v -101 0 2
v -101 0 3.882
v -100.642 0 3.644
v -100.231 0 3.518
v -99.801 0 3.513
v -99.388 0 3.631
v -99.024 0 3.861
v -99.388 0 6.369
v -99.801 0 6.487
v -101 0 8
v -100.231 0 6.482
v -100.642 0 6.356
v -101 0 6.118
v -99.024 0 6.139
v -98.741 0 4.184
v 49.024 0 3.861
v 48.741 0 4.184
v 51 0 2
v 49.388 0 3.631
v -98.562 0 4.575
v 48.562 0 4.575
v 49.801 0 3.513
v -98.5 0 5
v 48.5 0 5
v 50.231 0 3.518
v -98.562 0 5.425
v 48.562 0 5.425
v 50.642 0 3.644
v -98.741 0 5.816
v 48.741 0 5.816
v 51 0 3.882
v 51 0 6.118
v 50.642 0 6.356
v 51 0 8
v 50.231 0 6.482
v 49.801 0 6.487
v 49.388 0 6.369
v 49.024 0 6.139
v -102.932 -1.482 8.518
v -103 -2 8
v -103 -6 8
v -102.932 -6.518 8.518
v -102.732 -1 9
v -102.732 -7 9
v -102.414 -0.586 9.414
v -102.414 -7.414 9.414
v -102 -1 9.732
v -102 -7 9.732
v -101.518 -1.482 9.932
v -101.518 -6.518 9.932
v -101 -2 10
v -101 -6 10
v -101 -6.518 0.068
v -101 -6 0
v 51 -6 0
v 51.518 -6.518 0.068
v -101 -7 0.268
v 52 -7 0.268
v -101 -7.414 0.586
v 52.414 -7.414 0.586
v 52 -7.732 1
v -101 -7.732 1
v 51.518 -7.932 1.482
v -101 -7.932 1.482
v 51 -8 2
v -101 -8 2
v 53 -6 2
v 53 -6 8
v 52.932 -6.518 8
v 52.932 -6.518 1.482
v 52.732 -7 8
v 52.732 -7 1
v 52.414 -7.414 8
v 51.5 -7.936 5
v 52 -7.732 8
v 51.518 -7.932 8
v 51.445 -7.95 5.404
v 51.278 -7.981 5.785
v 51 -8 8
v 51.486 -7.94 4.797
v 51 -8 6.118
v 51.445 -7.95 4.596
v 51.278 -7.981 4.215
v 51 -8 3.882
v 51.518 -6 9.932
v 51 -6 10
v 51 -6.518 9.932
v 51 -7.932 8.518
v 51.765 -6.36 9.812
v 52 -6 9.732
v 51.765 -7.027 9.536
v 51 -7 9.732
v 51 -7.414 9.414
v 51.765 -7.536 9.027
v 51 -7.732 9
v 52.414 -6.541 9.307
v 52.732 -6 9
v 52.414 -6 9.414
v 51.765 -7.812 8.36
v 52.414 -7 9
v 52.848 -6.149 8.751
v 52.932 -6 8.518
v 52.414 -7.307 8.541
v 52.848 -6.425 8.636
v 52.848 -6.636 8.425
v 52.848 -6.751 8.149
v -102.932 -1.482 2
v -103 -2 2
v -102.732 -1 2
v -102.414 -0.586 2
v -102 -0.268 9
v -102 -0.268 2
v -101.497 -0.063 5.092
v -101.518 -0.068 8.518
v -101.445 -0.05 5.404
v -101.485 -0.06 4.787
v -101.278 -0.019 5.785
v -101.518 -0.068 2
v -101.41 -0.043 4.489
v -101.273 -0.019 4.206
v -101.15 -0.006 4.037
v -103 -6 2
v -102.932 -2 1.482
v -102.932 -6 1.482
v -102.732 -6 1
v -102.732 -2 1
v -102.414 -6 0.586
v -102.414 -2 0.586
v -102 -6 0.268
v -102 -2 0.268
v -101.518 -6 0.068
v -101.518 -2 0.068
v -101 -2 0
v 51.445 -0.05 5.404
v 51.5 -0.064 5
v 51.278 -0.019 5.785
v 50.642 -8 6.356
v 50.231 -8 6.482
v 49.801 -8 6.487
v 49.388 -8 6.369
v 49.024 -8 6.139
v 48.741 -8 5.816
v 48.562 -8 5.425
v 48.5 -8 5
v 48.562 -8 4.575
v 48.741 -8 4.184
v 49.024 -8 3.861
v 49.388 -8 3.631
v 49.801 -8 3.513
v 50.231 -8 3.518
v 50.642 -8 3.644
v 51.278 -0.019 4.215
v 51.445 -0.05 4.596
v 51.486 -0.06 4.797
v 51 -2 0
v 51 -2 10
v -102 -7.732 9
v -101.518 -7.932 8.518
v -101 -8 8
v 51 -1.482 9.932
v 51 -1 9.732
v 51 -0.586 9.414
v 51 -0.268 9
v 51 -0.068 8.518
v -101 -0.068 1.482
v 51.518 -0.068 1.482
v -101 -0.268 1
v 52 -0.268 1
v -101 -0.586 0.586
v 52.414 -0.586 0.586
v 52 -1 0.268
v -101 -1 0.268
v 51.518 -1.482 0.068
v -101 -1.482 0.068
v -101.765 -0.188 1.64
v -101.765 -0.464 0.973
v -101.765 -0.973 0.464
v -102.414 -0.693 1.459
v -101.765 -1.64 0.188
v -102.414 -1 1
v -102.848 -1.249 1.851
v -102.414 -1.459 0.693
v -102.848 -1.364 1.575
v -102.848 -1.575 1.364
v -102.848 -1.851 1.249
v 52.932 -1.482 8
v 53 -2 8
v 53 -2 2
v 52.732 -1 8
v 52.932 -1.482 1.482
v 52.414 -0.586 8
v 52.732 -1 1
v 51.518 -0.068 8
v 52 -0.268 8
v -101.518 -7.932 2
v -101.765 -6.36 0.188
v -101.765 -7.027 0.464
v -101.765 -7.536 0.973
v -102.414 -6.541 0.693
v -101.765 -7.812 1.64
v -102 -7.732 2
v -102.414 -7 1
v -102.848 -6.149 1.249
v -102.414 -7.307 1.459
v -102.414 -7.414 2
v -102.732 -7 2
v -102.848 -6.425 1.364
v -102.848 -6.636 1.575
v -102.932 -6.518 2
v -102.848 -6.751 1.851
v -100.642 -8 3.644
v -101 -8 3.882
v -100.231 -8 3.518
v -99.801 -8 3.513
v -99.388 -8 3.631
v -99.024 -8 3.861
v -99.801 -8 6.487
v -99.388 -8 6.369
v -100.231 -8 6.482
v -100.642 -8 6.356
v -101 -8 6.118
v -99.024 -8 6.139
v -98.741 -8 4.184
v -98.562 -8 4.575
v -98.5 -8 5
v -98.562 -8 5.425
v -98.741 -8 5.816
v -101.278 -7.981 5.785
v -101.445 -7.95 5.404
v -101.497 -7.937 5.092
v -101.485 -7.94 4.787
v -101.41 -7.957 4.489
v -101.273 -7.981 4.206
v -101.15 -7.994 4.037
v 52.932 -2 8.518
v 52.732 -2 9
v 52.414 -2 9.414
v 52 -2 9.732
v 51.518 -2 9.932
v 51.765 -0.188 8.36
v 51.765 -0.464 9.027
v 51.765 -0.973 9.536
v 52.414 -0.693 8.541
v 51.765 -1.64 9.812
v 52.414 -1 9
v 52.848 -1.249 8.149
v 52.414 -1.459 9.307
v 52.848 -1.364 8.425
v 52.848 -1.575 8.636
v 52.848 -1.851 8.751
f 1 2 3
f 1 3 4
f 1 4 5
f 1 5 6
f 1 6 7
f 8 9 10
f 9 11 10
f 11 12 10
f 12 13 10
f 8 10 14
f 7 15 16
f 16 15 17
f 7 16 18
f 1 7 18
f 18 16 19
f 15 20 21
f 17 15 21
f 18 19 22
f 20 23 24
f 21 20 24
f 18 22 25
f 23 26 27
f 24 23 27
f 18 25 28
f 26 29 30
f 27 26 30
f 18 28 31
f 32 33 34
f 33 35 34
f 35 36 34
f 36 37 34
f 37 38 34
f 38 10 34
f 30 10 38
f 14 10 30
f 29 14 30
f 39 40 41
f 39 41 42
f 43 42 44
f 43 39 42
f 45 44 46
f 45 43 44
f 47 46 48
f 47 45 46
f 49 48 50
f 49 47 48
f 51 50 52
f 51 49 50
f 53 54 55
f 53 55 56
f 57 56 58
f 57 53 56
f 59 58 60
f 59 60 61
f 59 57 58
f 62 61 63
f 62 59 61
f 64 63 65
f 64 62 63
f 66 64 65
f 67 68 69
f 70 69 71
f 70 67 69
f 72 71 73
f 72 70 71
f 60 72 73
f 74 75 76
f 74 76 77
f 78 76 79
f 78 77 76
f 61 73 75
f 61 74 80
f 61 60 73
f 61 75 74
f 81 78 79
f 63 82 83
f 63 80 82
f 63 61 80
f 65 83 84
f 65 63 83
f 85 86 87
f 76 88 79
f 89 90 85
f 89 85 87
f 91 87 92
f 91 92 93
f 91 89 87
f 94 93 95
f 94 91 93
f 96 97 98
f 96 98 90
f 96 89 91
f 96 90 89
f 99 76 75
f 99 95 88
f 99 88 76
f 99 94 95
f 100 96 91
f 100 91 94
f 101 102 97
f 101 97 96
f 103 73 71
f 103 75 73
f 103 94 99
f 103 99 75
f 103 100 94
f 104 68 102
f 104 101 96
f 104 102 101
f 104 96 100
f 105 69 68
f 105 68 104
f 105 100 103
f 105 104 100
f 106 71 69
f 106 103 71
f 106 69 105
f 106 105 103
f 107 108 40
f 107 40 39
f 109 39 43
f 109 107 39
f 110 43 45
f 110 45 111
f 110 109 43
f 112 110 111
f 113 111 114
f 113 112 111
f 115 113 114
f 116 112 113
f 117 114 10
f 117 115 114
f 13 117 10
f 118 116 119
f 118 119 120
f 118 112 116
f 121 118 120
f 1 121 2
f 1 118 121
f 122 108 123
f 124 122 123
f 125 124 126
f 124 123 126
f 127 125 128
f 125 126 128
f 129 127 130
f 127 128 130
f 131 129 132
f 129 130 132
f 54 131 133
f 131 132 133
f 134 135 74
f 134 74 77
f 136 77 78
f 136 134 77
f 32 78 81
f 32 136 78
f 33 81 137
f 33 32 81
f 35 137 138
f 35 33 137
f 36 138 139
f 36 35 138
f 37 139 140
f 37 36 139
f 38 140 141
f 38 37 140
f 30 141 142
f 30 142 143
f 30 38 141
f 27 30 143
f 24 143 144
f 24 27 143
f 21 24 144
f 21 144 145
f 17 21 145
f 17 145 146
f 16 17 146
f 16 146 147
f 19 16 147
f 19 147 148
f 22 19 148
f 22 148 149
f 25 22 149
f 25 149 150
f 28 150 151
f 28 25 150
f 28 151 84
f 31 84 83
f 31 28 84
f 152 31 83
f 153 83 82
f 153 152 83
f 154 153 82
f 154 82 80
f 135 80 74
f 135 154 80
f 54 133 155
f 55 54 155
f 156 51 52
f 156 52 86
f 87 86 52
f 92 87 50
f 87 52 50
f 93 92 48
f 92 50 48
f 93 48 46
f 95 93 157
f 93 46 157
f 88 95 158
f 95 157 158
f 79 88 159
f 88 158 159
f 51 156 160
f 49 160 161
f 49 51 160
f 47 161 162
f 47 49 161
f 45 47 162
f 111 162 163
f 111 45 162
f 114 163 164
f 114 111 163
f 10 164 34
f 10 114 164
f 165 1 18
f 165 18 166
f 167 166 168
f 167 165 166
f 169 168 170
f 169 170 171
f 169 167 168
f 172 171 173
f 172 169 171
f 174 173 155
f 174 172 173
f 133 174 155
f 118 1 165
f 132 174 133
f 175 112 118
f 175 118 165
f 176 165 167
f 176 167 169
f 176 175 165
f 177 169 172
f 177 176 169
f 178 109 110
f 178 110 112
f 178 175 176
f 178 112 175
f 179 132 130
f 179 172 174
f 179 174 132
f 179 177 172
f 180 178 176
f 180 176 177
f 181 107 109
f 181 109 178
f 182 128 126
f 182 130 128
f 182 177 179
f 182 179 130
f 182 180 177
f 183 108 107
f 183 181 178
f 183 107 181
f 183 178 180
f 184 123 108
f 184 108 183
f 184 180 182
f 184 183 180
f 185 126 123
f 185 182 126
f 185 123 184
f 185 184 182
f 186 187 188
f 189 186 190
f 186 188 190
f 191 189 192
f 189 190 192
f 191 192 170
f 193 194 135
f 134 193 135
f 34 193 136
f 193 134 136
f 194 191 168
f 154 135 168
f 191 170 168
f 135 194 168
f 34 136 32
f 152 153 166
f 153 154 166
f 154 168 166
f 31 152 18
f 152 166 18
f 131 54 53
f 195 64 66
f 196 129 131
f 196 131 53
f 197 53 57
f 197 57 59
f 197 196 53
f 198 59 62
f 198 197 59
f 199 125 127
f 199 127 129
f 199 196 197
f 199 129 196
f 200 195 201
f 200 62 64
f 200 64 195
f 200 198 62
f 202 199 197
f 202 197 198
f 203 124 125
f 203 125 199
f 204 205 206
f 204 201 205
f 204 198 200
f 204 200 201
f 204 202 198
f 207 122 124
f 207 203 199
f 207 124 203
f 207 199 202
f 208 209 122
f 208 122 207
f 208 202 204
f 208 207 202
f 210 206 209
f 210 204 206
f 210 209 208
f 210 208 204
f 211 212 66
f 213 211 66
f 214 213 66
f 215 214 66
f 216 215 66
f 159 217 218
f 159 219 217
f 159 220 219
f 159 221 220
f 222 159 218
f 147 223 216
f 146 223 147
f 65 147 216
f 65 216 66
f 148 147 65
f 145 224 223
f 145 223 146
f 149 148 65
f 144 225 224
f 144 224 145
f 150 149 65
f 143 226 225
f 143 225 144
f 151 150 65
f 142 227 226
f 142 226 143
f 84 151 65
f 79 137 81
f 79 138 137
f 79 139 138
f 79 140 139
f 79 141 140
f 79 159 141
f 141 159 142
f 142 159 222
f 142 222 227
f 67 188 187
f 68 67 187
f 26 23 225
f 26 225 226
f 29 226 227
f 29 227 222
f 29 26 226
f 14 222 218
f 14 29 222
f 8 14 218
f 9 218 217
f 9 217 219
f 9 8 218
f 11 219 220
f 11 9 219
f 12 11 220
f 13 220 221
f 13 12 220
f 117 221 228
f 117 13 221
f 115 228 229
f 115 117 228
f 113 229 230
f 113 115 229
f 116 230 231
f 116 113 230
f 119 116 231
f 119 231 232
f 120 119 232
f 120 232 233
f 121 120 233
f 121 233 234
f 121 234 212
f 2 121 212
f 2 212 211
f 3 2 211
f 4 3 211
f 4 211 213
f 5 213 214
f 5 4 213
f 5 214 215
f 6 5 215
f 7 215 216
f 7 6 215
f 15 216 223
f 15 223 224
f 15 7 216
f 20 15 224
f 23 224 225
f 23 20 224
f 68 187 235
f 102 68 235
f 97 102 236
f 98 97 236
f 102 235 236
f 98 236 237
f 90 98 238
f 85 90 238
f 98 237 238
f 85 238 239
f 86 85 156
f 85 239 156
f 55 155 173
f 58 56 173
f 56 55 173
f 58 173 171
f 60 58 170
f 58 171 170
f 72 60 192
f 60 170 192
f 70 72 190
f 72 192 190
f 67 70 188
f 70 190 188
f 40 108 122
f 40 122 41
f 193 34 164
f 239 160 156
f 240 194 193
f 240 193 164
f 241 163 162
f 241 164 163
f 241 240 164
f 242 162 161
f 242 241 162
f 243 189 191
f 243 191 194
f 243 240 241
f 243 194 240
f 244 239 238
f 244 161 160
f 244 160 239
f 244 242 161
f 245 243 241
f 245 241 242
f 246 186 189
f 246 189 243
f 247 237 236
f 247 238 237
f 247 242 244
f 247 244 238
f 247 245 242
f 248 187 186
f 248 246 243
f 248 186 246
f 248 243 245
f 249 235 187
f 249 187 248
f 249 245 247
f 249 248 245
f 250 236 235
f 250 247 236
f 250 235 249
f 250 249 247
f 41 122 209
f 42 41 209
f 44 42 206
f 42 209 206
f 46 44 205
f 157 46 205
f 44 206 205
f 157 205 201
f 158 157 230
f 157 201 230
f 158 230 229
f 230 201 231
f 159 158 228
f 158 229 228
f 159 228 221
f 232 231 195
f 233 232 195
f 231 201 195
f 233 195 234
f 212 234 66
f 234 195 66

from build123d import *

# Parameters (mm, degrees)
F0_W         = 156
F0_H         = 10
F0_R         = 1.5
F1_DEPTH     = 8
F2_T1_DEPTH  = 4
F2_T3_DEPTH  = 18
F2_T5_DEPTH  = 159
F2_T7_DEPTH  = 13
F2_S11_W     = 2
F2_S11_H     = 2
F2_T12_DEPTH = 2
F2_S17_W     = 2
F2_S17_H     = 2
F2_T18_DEPTH = 2
F3_T1_DEPTH  = 11
F3_T3_DEPTH  = 4
F3_T5_DEPTH  = 157
F3_S9_W      = 2.04
F3_S9_H      = 2.04
F3_T10_DEPTH = 2.04
F3_S15_W     = 2.04
F3_S15_H     = 2.04
F3_T16_DEPTH = 2.04


# Not quite as in the source:
# - a fillet or chamfer that OpenCascade refuses, or shapes differently, is made with other operations: its cross-section is extruded or revolved along the edge and cut away or added


with BuildPart() as f1:
    # F0 (on Front) → F1 (new body)
    with BuildSketch(Plane.XZ):
        with Locations((-25, 5)):
            Rectangle(F0_W, F0_H)
        with Locations((-100, 5)):
            Circle(F0_R, mode=Mode.SUBTRACT)
        with Locations((50, 5)):
            Circle(F0_R, mode=Mode.SUBTRACT)
    extrude(amount=F1_DEPTH)

    # F2: fillet of radius 2 on 7 edges, made by hand

    # F2_s2 → F2_t1 (cut)
    with BuildSketch(Plane.XZ.offset(2)):
        with BuildLine():
            ThreePointArc((53, 8), (52.4142135624, 9.4142135624), (51, 10))
            Line((51, 10), (53, 10))
            Line((53, 10), (53, 8))
        make_face()
    extrude(amount=F2_T1_DEPTH, mode=Mode.SUBTRACT)

    # F2_s4 → F2_t3 (cut)
    with BuildSketch(Plane.XZ.offset(-5)):
        with BuildLine():
            ThreePointArc((-103, 8), (-102.4142135624, 9.4142135624), (-101, 10))
            Line((-101, 10), (-103, 10))
            Line((-103, 10), (-103, 8))
        make_face()
        with BuildLine():
            ThreePointArc((51, 0), (52.4142135624, 0.5857864376), (53, 2))
            Line((53, 2), (53, 0))
            Line((53, 0), (51, 0))
        make_face()
    extrude(amount=F2_T3_DEPTH, mode=Mode.SUBTRACT)

    # F2_s6 → F2_t5 (cut)
    with BuildSketch(Plane.YZ.offset(-108)):
        with BuildLine():
            ThreePointArc((-2, 10), (-0.5857864376, 9.4142135624), (0, 8))
            Line((0, 8), (0, 10))
            Line((0, 10), (-2, 10))
        make_face()
        with BuildLine():
            ThreePointArc((-6, 10), (-7.4142135624, 9.4142135624), (-8, 8))
            Line((-8, 8), (-8, 10))
            Line((-8, 10), (-6, 10))
        make_face()
    extrude(amount=F2_T5_DEPTH, mode=Mode.SUBTRACT)

    # F2_s8 → F2_t7 (cut)
    with BuildSketch(Plane.XY.offset(-5)):
        with BuildLine():
            ThreePointArc((53, -2), (52.4142135624, -0.5857864376), (51, 0))
            Line((51, 0), (53, 0))
            Line((53, 0), (53, -2))
        make_face()
        with BuildLine():
            ThreePointArc((53, -6), (52.4142135624, -7.4142135624), (51, -8))
            Line((51, -8), (53, -8))
            Line((53, -8), (53, -6))
        make_face()
    extrude(amount=F2_T7_DEPTH, mode=Mode.SUBTRACT)


with BuildPart() as f2_tool10:
    # F2_s11 → F2_t12 (new body)
    with BuildSketch(Plane.YZ.offset(51)):
        with Locations((-1, 9)):
            Rectangle(F2_S11_W, F2_S11_H)
    extrude(amount=F2_T12_DEPTH)

    # F2_s13 → F2_t14 (revolve, cut)
    with BuildSketch(Plane(origin=(51, -2, 8), x_dir=(0, -0.7071067812, -0.7071067812), z_dir=(0, -0.7071067812, 0.7071067812))):
        with BuildLine():
            ThreePointArc((0, -2), (2, 0), (0, 2))
            Line((0, 2), (0, -2))
        make_face()
    revolve(axis=Axis((51, -2, 8), (1, 0, 0)), mode=Mode.SUBTRACT)


with BuildPart() as f1_1:
    add(f1.part)

    # F2_t9: cut F2_tool10
    add(f2_tool10.part, mode=Mode.SUBTRACT)


with BuildPart() as f2_tool16:
    # F2_s17 → F2_t18 (new body)
    with BuildSketch(Plane.YZ.offset(51)):
        with Locations((-7, 9)):
            Rectangle(F2_S17_W, F2_S17_H)
    extrude(amount=F2_T18_DEPTH)

    # F2_s19 → F2_t20 (revolve, cut)
    with BuildSketch(Plane(origin=(51, -6, 8), x_dir=(0, 0.7071067812, -0.7071067812), z_dir=(0, -0.7071067812, -0.7071067812))):
        with BuildLine():
            ThreePointArc((0, -2), (2, 0), (0, 2))
            Line((0, 2), (0, -2))
        make_face()
    revolve(axis=Axis((51, -6, 8), (1, 0, 0)), mode=Mode.SUBTRACT)


with BuildPart() as f1_2:
    add(f1_1.part)

    # F2_t15: cut F2_tool16
    add(f2_tool16.part, mode=Mode.SUBTRACT)

    # F3: fillet of radius 2 on 7 edges, made by hand

    # F3_s2 → F3_t1 (cut)
    with BuildSketch(Plane.XY.offset(2)):
        with BuildLine():
            ThreePointArc((-103, -2), (-102.4142135624, -0.5857864376), (-101, 0))
            Line((-101, 0), (-103, 0))
            Line((-103, 0), (-103, -2))
        make_face()
        with BuildLine():
            ThreePointArc((-103, -6), (-102.4142135624, -7.4142135624), (-101, -8))
            Line((-101, -8), (-103, -8))
            Line((-103, -8), (-103, -6))
        make_face()
    extrude(amount=F3_T1_DEPTH, mode=Mode.SUBTRACT)

    # F3_s4 → F3_t3 (cut)
    with BuildSketch(Plane.XZ.offset(2)):
        with BuildLine():
            ThreePointArc((-103, 2), (-102.4142135624, 0.5857864376), (-101, 0))
            Line((-101, 0), (-103, 0))
            Line((-103, 0), (-103, 2))
        make_face()
    extrude(amount=F3_T3_DEPTH, mode=Mode.SUBTRACT)

    # F3_s6 → F3_t5 (cut)
    with BuildSketch(Plane.YZ.offset(-101)):
        with BuildLine():
            ThreePointArc((0, 2), (-0.5857864376, 0.5857864376), (-2, 0))
            Line((-2, 0), (0, 0))
            Line((0, 0), (0, 2))
        make_face()
        with BuildLine():
            ThreePointArc((-6, 0), (-7.4142135624, 0.5857864376), (-8, 2))
            Line((-8, 2), (-8, 0))
            Line((-8, 0), (-6, 0))
        make_face()
    extrude(amount=F3_T5_DEPTH, mode=Mode.SUBTRACT)


with BuildPart() as f3_tool8:
    # F3_s9 → F3_t10 (new body)
    with BuildSketch(Plane.YZ.offset(-101)):
        with Locations((-0.98, 0.98)):
            Rectangle(F3_S9_W, F3_S9_H)
    extrude(amount=-F3_T10_DEPTH)

    # F3_s11 → F3_t12 (revolve, cut)
    with BuildSketch(Plane(origin=(-101, -2, 2), x_dir=(0, -0.7071067812, 0.7071067812), z_dir=(0, -0.7071067812, -0.7071067812))):
        with BuildLine():
            ThreePointArc((0, -2), (2, 0), (0, 2))
            Line((0, 2), (0, -2))
        make_face()
    revolve(axis=Axis((-101, -2, 2), (-1, 0, 0)), mode=Mode.SUBTRACT)


with BuildPart() as f1_3:
    add(f1_2.part)

    # F3_t7: cut F3_tool8
    add(f3_tool8.part, mode=Mode.SUBTRACT)


with BuildPart() as f3_tool14:
    # F3_s15 → F3_t16 (new body)
    with BuildSketch(Plane.YZ.offset(-101)):
        with Locations((-7.02, 0.98)):
            Rectangle(F3_S15_W, F3_S15_H)
    extrude(amount=-F3_T16_DEPTH)

    # F3_s17 → F3_t18 (revolve, cut)
    with BuildSketch(Plane(origin=(-101, -6, 2), x_dir=(0, 0.7071067812, 0.7071067812), z_dir=(0, -0.7071067812, 0.7071067812))):
        with BuildLine():
            ThreePointArc((0, -2), (2, 0), (0, 2))
            Line((0, 2), (0, -2))
        make_face()
    revolve(axis=Axis((-101, -6, 2), (-1, 0, 0)), mode=Mode.SUBTRACT)


with BuildPart() as f1_4:
    add(f1_3.part)

    # F3_t13: cut F3_tool14
    add(f3_tool14.part, mode=Mode.SUBTRACT)


solid = f1_4.part
